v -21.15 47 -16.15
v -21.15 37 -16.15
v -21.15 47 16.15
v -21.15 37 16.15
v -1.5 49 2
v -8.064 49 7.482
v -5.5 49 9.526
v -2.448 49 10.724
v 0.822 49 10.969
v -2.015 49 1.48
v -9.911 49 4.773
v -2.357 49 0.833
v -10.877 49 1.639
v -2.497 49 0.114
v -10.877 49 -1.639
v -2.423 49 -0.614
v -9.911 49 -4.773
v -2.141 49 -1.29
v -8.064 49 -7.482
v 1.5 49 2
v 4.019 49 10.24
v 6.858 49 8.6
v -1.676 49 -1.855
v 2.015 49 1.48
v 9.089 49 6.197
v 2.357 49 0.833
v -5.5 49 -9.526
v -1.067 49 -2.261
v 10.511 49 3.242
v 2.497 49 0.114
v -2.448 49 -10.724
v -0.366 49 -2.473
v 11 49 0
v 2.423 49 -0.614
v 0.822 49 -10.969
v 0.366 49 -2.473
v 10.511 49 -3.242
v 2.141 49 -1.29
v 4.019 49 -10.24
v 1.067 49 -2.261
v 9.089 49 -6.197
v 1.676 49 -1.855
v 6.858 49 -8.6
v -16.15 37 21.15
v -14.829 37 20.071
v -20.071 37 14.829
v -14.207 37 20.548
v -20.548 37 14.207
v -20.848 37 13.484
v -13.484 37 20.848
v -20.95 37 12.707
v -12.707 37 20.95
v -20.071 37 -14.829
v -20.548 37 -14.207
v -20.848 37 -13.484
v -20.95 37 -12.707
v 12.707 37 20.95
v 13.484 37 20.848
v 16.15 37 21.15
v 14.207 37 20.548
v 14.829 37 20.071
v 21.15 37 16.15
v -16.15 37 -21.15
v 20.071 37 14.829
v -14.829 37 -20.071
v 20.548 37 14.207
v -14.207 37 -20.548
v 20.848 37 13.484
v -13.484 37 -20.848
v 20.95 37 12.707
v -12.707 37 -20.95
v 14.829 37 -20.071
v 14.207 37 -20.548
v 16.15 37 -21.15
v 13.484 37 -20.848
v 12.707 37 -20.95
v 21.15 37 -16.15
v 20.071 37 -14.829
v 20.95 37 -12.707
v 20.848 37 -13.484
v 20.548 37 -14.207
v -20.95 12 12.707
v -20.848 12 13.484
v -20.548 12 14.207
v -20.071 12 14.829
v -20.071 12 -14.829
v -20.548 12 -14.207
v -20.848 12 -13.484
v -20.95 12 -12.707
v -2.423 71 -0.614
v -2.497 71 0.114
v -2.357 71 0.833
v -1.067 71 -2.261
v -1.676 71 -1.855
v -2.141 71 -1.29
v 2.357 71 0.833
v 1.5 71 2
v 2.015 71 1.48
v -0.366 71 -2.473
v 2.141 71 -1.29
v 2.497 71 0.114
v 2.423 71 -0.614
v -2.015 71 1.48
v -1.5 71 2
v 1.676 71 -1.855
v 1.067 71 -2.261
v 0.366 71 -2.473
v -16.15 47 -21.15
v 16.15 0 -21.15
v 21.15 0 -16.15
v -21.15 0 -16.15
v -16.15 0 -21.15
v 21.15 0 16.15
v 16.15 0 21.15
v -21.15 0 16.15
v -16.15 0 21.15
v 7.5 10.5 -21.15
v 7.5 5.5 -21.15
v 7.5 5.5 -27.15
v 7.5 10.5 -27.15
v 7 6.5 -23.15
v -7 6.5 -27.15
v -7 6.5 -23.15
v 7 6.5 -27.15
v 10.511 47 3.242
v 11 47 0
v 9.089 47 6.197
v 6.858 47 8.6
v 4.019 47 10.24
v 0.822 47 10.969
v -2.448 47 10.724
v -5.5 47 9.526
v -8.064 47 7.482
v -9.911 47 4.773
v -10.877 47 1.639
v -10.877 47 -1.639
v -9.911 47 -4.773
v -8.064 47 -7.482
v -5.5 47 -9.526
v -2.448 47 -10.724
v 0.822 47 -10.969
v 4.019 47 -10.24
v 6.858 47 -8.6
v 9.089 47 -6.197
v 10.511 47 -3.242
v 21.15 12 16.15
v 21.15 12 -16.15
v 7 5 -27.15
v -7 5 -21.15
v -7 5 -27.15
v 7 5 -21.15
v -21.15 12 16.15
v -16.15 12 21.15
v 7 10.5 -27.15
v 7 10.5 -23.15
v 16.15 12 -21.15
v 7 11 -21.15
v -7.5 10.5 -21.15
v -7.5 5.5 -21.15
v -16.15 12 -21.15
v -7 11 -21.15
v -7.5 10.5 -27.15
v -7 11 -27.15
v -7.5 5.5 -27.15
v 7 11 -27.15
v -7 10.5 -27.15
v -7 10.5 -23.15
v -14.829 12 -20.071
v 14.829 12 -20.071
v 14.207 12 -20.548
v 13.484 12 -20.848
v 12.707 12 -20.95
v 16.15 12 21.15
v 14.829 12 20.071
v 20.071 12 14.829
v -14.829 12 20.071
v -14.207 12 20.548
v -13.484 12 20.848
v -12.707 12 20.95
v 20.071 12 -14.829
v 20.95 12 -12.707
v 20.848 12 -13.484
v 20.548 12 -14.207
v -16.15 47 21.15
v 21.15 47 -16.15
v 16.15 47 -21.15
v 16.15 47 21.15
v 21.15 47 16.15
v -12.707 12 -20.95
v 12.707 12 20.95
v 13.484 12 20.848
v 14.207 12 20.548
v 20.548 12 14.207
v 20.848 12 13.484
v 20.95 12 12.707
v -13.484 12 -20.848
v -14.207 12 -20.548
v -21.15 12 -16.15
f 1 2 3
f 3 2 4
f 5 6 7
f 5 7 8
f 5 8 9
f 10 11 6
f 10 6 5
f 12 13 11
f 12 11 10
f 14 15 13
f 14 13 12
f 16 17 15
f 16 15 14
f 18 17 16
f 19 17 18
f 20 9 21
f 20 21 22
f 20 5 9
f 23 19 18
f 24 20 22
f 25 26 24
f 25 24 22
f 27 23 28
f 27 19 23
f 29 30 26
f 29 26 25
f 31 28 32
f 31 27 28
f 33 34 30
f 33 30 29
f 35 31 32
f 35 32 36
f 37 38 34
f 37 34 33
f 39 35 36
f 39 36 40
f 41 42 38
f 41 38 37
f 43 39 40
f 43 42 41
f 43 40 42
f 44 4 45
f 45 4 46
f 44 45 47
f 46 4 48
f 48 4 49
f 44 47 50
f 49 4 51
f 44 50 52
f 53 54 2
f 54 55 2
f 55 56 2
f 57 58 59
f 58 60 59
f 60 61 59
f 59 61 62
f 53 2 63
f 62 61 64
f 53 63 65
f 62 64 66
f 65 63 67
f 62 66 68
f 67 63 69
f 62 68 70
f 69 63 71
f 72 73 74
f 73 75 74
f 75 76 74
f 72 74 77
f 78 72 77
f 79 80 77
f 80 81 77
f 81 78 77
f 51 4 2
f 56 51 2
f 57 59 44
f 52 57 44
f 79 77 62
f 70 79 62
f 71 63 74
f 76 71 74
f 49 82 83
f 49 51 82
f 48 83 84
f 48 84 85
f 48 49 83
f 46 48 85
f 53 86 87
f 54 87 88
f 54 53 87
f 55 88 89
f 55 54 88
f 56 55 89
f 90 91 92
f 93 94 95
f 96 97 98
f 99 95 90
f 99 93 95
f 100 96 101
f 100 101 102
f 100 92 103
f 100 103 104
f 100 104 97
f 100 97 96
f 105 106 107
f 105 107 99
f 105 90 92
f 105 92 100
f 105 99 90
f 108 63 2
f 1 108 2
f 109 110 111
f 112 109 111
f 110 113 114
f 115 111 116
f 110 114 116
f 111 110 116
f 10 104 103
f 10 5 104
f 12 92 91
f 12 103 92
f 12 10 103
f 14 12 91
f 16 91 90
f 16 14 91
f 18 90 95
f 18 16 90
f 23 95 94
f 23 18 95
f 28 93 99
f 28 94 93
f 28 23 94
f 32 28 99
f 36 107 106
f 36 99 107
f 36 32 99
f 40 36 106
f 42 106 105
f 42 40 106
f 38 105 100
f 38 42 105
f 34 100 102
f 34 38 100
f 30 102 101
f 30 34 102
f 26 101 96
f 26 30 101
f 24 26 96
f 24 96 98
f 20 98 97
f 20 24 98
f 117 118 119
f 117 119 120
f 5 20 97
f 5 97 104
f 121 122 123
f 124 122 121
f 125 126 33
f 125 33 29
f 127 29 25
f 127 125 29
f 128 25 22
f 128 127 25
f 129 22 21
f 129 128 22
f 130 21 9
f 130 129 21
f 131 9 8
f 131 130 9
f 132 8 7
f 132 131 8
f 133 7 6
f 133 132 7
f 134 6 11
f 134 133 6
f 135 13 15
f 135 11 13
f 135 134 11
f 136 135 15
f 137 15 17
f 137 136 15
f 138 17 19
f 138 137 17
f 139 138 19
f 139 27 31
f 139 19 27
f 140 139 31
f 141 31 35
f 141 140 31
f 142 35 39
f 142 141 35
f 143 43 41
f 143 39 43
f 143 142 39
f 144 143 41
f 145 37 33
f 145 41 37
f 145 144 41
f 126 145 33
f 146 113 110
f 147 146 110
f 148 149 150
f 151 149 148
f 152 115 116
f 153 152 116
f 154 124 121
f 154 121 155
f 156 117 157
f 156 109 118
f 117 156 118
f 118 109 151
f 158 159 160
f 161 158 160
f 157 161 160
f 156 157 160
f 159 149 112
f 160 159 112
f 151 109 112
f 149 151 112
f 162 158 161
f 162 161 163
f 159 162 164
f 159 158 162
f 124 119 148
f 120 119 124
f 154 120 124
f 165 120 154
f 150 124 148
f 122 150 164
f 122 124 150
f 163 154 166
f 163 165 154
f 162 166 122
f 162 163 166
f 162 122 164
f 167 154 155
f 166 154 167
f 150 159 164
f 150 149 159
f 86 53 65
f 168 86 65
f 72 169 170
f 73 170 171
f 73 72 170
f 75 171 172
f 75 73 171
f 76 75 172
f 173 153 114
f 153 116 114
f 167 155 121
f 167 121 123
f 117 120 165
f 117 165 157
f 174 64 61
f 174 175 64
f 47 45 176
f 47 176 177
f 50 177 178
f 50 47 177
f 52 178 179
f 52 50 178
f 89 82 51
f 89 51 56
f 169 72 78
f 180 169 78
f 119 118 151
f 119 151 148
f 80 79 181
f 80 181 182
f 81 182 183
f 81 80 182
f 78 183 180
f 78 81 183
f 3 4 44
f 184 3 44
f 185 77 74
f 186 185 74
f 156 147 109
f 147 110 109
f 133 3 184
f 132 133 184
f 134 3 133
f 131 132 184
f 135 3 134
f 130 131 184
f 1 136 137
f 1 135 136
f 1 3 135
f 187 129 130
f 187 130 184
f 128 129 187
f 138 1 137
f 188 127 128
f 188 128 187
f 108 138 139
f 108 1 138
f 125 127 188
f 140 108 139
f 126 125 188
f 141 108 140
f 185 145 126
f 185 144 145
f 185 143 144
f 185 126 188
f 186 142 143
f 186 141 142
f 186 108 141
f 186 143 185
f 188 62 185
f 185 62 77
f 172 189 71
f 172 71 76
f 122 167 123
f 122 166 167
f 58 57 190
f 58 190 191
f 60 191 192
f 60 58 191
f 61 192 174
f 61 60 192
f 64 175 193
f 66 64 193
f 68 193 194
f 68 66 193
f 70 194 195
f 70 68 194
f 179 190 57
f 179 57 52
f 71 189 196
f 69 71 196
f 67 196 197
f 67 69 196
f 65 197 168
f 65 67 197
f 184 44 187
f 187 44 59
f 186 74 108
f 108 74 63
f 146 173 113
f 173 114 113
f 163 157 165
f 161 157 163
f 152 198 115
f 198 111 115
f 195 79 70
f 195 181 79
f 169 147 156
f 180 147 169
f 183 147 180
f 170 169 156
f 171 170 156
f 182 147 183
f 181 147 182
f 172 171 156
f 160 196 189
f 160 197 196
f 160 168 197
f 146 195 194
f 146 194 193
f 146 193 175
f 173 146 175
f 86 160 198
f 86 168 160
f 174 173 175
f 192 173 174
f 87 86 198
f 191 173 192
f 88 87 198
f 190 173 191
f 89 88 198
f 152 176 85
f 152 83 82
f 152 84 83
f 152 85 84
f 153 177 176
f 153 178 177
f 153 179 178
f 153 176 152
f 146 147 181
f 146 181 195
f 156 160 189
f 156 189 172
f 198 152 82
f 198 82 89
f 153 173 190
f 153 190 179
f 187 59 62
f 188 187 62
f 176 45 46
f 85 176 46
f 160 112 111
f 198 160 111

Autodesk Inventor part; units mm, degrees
ref_plane "YZ Plane" through (0, 0, 0) normal (1, 0, 0) x (0, 1, 0)
ref_plane "XZ Plane" through (0, 0, 0) normal (0, 1, 0) x (-1, 0, 0)
ref_plane "XY Plane" through (0, 0, 0) normal (0, 0, 1) x (1, 0, 0)
sketch "Эскиз1" plane through (0, 0, 0) normal (0, 1, 0) x (-1, 0, 0)
  line L0 (16.15, 21.15) -> (-16.15, 21.15)
  line L1 (-21.15, 16.15) -> (-21.15, -16.15)
  line L2 (-16.15, -21.15) -> (16.15, -21.15)
  line L3 (21.15, -16.15) -> (21.15, 16.15)
  line L4 (21.15, 21.15) -> (-21.15, -21.15) construction
  line L5 (-21.15, 21.15) -> (21.15, -21.15) construction
  line L6 (16.15, -21.15) -> (21.15, -16.15)
  line L7 (21.15, 16.15) -> (16.15, 21.15)
  line L8 (-16.15, 21.15) -> (-21.15, 16.15)
  line L9 (-21.15, -16.15) -> (-16.15, -21.15)
  point P0 (0, 0)
  dimension "d0" = 42.3
  dimension "d1" = 5
  dimension "d2" = 5
  dimension "d3" = 5
  dimension "d4" = 5
  dimension "d5" = 5
  dimension "d6" = 5
  dimension "d7" = 5
  dimension "d8" = 5
extrude "Выдавливание1" add sketch "Эскиз1" along normal blind 12
sketch "Эскиз2" plane through (0, 12, 0) normal (0, 1, 0) x (1, 0, 0)
  line L0 (13.95, -20.95) -> (-13.95, -20.95)
  line L1 (-20.95, -13.95) -> (-20.95, 13.95)
  line L2 (-13.95, 20.95) -> (13.95, 20.95)
  line L3 (20.95, 13.95) -> (20.95, -13.95)
  line L4 (20.95, -20.95) -> (-20.95, 20.95) construction
  line L5 (-20.95, -20.95) -> (20.95, 20.95) construction
  line L6 (-16.15, -21.15) -> (16.15, -21.15) projected
  line L7 (-13.95, -20.95) -> (-20.95, -13.95)
  line L8 (-20.95, 13.95) -> (-13.95, 20.95)
  line L9 (13.95, 20.95) -> (20.95, 13.95)
  line L10 (20.95, -13.95) -> (13.95, -20.95)
  point P0 (0, 0)
  dimension "d23" = 0.2
  dimension "d24" = 7
  dimension "d25" = 7
  dimension "d26" = 7
  dimension "d27" = 7
  dimension "d28" = 7
  dimension "d29" = 7
  dimension "d30" = 7
  dimension "d31" = 7
extrude "Выдавливание2" add sketch "Эскиз2" along normal blind 25
sketch "Эскиз3" plane through (0, 37, 0) normal (0, 1, 0) x (1, 0, 0)
  line L0 (-16.15, 21.15) -> (-21.15, 16.15) projected
  line L1 (16.15, 21.15) -> (-16.15, 21.15) projected
  line L2 (21.15, 16.15) -> (16.15, 21.15) projected
  line L3 (21.15, -16.15) -> (21.15, 16.15) projected
  line L4 (16.15, -21.15) -> (21.15, -16.15) projected
  line L5 (-16.15, -21.15) -> (16.15, -21.15) projected
  line L6 (-21.15, -16.15) -> (-16.15, -21.15) projected
  line L7 (-21.15, 16.15) -> (-21.15, -16.15) projected
  point P0 (0, 0)
extrude "Выдавливание3" add sketch "Эскиз3" along normal blind 10
fillet "Сопряжение1" radius 3 8 edges at (13.95, 24.5, 20.95) (20.95, 24.5, 13.95) (20.95, 24.5, -13.95) (13.95, 24.5, -20.95) (-13.95, 24.5, -20.95) (-20.95, 24.5, -13.95) (-20.95, 24.5, 13.95) (-13.95, 24.5, 20.95)
sketch "Эскиз4" plane through (0, 47, 0) normal (0, 1, 0) x (1, 0, 0)
  circle A0 centre (0, 0) radius 11
  dimension "d33" = 22
extrude "Выдавливание4" add sketch "Эскиз4" along normal blind 2
sketch "Эскиз5" plane through (0, 49, 0) normal (0, 1, 0) x (1, 0, 0)
  arc A0 (1.5, -2) -> (-1.5, -2) centre (0, 0) ccw
  line L0 (1.5, -2) -> (-1.5, -2)
  dimension "d36" = 2.5
  dimension "d37" = 2
extrude "Выдавливание5" add sketch "Эскиз5" along normal blind 22
sketch "Эскиз6" plane through (16.15, 0, -21.15) normal (0, 0, -1) x (-1, 0, 0)
  line L0 (0, 0) -> (32.3, 0) projected
  line L1 (8.65, 11) -> (23.65, 11)
  line L2 (23.65, 11) -> (23.65, 5)
  line L3 (23.65, 5) -> (8.65, 5)
  line L4 (8.65, 5) -> (8.65, 11)
  point P0 (16.15, 0)
  point P1 (16.15, 0)
  point P2 (16.15, 5)
  point P3 (16.15, 0)
  dimension "d67" = 15
  dimension "d68" = 6
  dimension "d69" = 5
extrude "Выдавливание6" add sketch "Эскиз6" along normal blind 6
sketch "Эскиз9" plane through (16.15, 0, -27.15) normal (0, 0, -1) x (-1, 0, 0)
  line L0 (9.15, 10.5) -> (23.15, 10.5)
  line L1 (23.15, 10.5) -> (23.15, 6.5)
  line L2 (23.15, 6.5) -> (9.15, 6.5)
  line L3 (9.15, 6.5) -> (9.15, 10.5)
  line L4 (23.65, 5) -> (23.65, 11) projected
  line L5 (23.65, 11) -> (8.65, 11) projected
  point P0 (16.15, 0)
  point P1 (16.15, 6.5)
  dimension "d70" = 0.5
  dimension "d71" = 0.5
  dimension "d72" = 4
extrude "Выдавливание8" cut sketch "Эскиз9" against normal blind 4
chamfer "Фаска1" distance 0.5 angle 45 4 edges at (7.5, 11, -24.15) (7.5, 5, -24.15) (-7.5, 11, -24.15) (-7.5, 5, -24.15)
equation "\"d2\" = d1"
equation "\"d3\" = d1"
equation "\"d4\" = d3"
equation "\"d5\" = d1"
equation "\"d6\" = d5"
equation "\"d7\" = d1"
equation "\"d8\" = d7"
equation "\"d25\" = d24"
equation "\"d26\" = d24"
equation "\"d27\" = d26"
equation "\"d28\" = d24"
equation "\"d29\" = d28"
equation "\"d30\" = d24"
equation "\"d31\" = d30"
properties part number "42BYGH47" material "Сталь, мягкая"
